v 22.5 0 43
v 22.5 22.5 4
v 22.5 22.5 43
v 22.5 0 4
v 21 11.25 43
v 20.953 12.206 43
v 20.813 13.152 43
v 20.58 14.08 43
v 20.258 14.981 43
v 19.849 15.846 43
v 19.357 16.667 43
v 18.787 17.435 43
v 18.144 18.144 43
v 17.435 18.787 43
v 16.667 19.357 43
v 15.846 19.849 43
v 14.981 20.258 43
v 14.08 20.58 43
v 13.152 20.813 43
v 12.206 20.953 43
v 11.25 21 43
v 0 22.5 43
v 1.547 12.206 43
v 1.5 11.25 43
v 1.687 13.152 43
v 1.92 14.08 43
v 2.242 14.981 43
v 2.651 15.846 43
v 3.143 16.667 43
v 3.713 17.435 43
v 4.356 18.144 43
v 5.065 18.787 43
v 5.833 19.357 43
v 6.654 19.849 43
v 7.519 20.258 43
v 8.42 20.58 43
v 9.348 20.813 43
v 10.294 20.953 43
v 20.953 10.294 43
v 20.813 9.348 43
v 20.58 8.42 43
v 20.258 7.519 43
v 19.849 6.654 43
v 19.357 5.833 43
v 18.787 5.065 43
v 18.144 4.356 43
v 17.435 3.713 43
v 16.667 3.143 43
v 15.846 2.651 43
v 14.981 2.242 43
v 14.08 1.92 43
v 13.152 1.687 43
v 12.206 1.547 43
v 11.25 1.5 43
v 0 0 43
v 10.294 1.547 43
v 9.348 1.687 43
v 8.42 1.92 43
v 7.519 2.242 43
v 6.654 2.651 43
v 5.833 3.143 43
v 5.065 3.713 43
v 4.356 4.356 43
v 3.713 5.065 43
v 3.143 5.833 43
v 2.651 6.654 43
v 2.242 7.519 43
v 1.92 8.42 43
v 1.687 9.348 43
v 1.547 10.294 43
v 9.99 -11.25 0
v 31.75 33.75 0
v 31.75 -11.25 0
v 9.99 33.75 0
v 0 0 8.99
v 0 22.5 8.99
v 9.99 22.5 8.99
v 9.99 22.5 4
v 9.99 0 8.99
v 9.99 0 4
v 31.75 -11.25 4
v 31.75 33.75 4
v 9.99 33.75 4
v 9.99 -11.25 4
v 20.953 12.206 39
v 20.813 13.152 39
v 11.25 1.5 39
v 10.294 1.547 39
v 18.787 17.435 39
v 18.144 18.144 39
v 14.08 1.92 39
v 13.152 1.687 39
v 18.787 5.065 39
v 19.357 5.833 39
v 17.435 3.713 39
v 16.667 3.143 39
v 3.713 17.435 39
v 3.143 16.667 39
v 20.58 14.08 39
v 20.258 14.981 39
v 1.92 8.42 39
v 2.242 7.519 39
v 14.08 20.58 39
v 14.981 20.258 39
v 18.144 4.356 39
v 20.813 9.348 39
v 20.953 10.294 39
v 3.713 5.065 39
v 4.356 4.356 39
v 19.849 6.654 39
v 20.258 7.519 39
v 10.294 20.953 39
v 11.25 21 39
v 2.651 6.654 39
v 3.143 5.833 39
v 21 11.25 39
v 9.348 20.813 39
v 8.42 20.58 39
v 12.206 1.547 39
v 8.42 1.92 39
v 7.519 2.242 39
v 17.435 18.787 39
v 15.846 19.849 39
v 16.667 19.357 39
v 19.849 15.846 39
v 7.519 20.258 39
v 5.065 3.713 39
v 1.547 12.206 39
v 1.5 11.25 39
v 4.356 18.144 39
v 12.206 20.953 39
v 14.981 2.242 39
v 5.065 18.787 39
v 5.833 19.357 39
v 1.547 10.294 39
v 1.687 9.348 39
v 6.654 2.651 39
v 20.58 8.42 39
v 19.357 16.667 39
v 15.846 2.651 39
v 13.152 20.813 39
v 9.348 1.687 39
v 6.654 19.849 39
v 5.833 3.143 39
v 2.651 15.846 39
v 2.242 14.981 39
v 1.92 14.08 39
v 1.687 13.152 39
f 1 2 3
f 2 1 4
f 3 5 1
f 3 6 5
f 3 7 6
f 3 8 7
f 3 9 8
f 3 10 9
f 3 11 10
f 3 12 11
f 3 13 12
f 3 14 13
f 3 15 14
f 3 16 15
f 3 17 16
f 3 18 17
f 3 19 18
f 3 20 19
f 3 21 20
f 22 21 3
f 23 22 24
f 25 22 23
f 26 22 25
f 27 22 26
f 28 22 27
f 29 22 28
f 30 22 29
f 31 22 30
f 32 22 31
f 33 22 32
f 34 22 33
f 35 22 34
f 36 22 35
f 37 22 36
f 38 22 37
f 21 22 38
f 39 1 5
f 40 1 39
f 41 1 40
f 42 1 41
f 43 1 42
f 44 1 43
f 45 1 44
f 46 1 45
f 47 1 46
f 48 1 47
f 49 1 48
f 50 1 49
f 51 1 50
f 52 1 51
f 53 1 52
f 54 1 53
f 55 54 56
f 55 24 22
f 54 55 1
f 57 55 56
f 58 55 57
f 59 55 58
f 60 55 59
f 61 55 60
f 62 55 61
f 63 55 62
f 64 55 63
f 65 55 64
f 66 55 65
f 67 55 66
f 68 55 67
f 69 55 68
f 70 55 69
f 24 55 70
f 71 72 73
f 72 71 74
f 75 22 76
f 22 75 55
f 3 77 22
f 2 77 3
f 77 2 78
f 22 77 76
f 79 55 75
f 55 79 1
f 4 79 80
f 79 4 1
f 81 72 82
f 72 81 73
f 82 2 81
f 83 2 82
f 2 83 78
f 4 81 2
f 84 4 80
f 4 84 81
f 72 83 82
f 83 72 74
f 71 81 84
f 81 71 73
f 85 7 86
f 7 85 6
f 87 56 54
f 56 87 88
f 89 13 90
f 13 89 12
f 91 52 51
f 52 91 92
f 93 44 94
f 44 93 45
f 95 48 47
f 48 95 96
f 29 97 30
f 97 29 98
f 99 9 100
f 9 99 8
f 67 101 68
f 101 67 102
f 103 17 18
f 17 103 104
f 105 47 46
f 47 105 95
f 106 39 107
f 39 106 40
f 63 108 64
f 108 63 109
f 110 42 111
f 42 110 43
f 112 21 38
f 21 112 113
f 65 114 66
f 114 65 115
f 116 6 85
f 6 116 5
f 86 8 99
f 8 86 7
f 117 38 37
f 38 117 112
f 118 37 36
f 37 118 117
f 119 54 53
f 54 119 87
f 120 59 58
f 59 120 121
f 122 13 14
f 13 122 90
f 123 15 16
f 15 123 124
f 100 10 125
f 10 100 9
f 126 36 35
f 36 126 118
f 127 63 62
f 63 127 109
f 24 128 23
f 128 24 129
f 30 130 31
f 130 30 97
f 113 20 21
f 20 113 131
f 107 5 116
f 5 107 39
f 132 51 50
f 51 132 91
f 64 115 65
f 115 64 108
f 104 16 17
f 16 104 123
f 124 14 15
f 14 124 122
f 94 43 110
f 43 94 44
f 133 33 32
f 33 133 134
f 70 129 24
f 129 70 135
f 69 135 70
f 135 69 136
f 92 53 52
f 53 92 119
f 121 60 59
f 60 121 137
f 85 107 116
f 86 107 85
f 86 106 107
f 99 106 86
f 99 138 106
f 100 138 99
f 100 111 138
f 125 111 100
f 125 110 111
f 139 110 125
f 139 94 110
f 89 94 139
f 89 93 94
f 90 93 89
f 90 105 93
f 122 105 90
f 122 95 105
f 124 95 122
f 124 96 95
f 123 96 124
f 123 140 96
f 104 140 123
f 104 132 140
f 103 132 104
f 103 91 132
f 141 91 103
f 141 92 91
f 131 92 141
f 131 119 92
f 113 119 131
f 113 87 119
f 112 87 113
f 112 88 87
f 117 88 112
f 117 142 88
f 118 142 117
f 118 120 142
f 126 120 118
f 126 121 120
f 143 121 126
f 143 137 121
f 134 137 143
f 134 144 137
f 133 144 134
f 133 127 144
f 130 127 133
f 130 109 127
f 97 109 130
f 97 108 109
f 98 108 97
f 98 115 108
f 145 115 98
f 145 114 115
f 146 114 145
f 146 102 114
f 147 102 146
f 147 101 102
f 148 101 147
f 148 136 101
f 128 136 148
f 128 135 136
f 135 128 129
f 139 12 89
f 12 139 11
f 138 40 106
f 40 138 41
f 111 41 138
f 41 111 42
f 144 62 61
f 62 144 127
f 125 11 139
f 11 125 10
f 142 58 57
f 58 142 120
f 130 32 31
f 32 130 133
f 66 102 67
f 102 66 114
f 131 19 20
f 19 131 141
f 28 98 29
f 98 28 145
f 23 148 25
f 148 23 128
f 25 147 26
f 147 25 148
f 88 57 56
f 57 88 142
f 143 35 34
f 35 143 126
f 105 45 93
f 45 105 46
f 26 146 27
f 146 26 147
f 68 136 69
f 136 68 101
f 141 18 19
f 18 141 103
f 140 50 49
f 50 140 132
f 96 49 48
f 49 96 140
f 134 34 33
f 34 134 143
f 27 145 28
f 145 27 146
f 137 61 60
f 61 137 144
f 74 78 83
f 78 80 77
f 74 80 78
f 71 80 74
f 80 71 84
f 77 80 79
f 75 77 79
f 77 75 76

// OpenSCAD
$fn=64;
d=19.5;
w=d+3;
h1=39;
h2=43;

h3a=9;
t3a=6;
h3b=51;
t3b=10;


//stutzvorne();
stutzhinten();

module stutzvorne(){
    difference(){
        union(){
           cube([w,w,h2]);
           translate([-2,-w/2,0]) cube([w*1.5,w*2,4]);
        }
        translate([w/2,w/2,h1])
           cylinder(d=d,h=h2-h1+0.01);        
    }
}

module stutzhinten(){    
    difference(){
        union(){
           cube([w,w,h2]);
           translate([0,-w/2,0]) 
                cube([w*1.5-2,w*2,4]);
        }
        translate([w/2,w/2,h1])
           cylinder(d=d,h=h2-h1+0.01);                
        translate([-0.01,-w/2-0.1,-0.01])
           cube([t3b,w*2+0.2,h3a]);
      
    }
}
